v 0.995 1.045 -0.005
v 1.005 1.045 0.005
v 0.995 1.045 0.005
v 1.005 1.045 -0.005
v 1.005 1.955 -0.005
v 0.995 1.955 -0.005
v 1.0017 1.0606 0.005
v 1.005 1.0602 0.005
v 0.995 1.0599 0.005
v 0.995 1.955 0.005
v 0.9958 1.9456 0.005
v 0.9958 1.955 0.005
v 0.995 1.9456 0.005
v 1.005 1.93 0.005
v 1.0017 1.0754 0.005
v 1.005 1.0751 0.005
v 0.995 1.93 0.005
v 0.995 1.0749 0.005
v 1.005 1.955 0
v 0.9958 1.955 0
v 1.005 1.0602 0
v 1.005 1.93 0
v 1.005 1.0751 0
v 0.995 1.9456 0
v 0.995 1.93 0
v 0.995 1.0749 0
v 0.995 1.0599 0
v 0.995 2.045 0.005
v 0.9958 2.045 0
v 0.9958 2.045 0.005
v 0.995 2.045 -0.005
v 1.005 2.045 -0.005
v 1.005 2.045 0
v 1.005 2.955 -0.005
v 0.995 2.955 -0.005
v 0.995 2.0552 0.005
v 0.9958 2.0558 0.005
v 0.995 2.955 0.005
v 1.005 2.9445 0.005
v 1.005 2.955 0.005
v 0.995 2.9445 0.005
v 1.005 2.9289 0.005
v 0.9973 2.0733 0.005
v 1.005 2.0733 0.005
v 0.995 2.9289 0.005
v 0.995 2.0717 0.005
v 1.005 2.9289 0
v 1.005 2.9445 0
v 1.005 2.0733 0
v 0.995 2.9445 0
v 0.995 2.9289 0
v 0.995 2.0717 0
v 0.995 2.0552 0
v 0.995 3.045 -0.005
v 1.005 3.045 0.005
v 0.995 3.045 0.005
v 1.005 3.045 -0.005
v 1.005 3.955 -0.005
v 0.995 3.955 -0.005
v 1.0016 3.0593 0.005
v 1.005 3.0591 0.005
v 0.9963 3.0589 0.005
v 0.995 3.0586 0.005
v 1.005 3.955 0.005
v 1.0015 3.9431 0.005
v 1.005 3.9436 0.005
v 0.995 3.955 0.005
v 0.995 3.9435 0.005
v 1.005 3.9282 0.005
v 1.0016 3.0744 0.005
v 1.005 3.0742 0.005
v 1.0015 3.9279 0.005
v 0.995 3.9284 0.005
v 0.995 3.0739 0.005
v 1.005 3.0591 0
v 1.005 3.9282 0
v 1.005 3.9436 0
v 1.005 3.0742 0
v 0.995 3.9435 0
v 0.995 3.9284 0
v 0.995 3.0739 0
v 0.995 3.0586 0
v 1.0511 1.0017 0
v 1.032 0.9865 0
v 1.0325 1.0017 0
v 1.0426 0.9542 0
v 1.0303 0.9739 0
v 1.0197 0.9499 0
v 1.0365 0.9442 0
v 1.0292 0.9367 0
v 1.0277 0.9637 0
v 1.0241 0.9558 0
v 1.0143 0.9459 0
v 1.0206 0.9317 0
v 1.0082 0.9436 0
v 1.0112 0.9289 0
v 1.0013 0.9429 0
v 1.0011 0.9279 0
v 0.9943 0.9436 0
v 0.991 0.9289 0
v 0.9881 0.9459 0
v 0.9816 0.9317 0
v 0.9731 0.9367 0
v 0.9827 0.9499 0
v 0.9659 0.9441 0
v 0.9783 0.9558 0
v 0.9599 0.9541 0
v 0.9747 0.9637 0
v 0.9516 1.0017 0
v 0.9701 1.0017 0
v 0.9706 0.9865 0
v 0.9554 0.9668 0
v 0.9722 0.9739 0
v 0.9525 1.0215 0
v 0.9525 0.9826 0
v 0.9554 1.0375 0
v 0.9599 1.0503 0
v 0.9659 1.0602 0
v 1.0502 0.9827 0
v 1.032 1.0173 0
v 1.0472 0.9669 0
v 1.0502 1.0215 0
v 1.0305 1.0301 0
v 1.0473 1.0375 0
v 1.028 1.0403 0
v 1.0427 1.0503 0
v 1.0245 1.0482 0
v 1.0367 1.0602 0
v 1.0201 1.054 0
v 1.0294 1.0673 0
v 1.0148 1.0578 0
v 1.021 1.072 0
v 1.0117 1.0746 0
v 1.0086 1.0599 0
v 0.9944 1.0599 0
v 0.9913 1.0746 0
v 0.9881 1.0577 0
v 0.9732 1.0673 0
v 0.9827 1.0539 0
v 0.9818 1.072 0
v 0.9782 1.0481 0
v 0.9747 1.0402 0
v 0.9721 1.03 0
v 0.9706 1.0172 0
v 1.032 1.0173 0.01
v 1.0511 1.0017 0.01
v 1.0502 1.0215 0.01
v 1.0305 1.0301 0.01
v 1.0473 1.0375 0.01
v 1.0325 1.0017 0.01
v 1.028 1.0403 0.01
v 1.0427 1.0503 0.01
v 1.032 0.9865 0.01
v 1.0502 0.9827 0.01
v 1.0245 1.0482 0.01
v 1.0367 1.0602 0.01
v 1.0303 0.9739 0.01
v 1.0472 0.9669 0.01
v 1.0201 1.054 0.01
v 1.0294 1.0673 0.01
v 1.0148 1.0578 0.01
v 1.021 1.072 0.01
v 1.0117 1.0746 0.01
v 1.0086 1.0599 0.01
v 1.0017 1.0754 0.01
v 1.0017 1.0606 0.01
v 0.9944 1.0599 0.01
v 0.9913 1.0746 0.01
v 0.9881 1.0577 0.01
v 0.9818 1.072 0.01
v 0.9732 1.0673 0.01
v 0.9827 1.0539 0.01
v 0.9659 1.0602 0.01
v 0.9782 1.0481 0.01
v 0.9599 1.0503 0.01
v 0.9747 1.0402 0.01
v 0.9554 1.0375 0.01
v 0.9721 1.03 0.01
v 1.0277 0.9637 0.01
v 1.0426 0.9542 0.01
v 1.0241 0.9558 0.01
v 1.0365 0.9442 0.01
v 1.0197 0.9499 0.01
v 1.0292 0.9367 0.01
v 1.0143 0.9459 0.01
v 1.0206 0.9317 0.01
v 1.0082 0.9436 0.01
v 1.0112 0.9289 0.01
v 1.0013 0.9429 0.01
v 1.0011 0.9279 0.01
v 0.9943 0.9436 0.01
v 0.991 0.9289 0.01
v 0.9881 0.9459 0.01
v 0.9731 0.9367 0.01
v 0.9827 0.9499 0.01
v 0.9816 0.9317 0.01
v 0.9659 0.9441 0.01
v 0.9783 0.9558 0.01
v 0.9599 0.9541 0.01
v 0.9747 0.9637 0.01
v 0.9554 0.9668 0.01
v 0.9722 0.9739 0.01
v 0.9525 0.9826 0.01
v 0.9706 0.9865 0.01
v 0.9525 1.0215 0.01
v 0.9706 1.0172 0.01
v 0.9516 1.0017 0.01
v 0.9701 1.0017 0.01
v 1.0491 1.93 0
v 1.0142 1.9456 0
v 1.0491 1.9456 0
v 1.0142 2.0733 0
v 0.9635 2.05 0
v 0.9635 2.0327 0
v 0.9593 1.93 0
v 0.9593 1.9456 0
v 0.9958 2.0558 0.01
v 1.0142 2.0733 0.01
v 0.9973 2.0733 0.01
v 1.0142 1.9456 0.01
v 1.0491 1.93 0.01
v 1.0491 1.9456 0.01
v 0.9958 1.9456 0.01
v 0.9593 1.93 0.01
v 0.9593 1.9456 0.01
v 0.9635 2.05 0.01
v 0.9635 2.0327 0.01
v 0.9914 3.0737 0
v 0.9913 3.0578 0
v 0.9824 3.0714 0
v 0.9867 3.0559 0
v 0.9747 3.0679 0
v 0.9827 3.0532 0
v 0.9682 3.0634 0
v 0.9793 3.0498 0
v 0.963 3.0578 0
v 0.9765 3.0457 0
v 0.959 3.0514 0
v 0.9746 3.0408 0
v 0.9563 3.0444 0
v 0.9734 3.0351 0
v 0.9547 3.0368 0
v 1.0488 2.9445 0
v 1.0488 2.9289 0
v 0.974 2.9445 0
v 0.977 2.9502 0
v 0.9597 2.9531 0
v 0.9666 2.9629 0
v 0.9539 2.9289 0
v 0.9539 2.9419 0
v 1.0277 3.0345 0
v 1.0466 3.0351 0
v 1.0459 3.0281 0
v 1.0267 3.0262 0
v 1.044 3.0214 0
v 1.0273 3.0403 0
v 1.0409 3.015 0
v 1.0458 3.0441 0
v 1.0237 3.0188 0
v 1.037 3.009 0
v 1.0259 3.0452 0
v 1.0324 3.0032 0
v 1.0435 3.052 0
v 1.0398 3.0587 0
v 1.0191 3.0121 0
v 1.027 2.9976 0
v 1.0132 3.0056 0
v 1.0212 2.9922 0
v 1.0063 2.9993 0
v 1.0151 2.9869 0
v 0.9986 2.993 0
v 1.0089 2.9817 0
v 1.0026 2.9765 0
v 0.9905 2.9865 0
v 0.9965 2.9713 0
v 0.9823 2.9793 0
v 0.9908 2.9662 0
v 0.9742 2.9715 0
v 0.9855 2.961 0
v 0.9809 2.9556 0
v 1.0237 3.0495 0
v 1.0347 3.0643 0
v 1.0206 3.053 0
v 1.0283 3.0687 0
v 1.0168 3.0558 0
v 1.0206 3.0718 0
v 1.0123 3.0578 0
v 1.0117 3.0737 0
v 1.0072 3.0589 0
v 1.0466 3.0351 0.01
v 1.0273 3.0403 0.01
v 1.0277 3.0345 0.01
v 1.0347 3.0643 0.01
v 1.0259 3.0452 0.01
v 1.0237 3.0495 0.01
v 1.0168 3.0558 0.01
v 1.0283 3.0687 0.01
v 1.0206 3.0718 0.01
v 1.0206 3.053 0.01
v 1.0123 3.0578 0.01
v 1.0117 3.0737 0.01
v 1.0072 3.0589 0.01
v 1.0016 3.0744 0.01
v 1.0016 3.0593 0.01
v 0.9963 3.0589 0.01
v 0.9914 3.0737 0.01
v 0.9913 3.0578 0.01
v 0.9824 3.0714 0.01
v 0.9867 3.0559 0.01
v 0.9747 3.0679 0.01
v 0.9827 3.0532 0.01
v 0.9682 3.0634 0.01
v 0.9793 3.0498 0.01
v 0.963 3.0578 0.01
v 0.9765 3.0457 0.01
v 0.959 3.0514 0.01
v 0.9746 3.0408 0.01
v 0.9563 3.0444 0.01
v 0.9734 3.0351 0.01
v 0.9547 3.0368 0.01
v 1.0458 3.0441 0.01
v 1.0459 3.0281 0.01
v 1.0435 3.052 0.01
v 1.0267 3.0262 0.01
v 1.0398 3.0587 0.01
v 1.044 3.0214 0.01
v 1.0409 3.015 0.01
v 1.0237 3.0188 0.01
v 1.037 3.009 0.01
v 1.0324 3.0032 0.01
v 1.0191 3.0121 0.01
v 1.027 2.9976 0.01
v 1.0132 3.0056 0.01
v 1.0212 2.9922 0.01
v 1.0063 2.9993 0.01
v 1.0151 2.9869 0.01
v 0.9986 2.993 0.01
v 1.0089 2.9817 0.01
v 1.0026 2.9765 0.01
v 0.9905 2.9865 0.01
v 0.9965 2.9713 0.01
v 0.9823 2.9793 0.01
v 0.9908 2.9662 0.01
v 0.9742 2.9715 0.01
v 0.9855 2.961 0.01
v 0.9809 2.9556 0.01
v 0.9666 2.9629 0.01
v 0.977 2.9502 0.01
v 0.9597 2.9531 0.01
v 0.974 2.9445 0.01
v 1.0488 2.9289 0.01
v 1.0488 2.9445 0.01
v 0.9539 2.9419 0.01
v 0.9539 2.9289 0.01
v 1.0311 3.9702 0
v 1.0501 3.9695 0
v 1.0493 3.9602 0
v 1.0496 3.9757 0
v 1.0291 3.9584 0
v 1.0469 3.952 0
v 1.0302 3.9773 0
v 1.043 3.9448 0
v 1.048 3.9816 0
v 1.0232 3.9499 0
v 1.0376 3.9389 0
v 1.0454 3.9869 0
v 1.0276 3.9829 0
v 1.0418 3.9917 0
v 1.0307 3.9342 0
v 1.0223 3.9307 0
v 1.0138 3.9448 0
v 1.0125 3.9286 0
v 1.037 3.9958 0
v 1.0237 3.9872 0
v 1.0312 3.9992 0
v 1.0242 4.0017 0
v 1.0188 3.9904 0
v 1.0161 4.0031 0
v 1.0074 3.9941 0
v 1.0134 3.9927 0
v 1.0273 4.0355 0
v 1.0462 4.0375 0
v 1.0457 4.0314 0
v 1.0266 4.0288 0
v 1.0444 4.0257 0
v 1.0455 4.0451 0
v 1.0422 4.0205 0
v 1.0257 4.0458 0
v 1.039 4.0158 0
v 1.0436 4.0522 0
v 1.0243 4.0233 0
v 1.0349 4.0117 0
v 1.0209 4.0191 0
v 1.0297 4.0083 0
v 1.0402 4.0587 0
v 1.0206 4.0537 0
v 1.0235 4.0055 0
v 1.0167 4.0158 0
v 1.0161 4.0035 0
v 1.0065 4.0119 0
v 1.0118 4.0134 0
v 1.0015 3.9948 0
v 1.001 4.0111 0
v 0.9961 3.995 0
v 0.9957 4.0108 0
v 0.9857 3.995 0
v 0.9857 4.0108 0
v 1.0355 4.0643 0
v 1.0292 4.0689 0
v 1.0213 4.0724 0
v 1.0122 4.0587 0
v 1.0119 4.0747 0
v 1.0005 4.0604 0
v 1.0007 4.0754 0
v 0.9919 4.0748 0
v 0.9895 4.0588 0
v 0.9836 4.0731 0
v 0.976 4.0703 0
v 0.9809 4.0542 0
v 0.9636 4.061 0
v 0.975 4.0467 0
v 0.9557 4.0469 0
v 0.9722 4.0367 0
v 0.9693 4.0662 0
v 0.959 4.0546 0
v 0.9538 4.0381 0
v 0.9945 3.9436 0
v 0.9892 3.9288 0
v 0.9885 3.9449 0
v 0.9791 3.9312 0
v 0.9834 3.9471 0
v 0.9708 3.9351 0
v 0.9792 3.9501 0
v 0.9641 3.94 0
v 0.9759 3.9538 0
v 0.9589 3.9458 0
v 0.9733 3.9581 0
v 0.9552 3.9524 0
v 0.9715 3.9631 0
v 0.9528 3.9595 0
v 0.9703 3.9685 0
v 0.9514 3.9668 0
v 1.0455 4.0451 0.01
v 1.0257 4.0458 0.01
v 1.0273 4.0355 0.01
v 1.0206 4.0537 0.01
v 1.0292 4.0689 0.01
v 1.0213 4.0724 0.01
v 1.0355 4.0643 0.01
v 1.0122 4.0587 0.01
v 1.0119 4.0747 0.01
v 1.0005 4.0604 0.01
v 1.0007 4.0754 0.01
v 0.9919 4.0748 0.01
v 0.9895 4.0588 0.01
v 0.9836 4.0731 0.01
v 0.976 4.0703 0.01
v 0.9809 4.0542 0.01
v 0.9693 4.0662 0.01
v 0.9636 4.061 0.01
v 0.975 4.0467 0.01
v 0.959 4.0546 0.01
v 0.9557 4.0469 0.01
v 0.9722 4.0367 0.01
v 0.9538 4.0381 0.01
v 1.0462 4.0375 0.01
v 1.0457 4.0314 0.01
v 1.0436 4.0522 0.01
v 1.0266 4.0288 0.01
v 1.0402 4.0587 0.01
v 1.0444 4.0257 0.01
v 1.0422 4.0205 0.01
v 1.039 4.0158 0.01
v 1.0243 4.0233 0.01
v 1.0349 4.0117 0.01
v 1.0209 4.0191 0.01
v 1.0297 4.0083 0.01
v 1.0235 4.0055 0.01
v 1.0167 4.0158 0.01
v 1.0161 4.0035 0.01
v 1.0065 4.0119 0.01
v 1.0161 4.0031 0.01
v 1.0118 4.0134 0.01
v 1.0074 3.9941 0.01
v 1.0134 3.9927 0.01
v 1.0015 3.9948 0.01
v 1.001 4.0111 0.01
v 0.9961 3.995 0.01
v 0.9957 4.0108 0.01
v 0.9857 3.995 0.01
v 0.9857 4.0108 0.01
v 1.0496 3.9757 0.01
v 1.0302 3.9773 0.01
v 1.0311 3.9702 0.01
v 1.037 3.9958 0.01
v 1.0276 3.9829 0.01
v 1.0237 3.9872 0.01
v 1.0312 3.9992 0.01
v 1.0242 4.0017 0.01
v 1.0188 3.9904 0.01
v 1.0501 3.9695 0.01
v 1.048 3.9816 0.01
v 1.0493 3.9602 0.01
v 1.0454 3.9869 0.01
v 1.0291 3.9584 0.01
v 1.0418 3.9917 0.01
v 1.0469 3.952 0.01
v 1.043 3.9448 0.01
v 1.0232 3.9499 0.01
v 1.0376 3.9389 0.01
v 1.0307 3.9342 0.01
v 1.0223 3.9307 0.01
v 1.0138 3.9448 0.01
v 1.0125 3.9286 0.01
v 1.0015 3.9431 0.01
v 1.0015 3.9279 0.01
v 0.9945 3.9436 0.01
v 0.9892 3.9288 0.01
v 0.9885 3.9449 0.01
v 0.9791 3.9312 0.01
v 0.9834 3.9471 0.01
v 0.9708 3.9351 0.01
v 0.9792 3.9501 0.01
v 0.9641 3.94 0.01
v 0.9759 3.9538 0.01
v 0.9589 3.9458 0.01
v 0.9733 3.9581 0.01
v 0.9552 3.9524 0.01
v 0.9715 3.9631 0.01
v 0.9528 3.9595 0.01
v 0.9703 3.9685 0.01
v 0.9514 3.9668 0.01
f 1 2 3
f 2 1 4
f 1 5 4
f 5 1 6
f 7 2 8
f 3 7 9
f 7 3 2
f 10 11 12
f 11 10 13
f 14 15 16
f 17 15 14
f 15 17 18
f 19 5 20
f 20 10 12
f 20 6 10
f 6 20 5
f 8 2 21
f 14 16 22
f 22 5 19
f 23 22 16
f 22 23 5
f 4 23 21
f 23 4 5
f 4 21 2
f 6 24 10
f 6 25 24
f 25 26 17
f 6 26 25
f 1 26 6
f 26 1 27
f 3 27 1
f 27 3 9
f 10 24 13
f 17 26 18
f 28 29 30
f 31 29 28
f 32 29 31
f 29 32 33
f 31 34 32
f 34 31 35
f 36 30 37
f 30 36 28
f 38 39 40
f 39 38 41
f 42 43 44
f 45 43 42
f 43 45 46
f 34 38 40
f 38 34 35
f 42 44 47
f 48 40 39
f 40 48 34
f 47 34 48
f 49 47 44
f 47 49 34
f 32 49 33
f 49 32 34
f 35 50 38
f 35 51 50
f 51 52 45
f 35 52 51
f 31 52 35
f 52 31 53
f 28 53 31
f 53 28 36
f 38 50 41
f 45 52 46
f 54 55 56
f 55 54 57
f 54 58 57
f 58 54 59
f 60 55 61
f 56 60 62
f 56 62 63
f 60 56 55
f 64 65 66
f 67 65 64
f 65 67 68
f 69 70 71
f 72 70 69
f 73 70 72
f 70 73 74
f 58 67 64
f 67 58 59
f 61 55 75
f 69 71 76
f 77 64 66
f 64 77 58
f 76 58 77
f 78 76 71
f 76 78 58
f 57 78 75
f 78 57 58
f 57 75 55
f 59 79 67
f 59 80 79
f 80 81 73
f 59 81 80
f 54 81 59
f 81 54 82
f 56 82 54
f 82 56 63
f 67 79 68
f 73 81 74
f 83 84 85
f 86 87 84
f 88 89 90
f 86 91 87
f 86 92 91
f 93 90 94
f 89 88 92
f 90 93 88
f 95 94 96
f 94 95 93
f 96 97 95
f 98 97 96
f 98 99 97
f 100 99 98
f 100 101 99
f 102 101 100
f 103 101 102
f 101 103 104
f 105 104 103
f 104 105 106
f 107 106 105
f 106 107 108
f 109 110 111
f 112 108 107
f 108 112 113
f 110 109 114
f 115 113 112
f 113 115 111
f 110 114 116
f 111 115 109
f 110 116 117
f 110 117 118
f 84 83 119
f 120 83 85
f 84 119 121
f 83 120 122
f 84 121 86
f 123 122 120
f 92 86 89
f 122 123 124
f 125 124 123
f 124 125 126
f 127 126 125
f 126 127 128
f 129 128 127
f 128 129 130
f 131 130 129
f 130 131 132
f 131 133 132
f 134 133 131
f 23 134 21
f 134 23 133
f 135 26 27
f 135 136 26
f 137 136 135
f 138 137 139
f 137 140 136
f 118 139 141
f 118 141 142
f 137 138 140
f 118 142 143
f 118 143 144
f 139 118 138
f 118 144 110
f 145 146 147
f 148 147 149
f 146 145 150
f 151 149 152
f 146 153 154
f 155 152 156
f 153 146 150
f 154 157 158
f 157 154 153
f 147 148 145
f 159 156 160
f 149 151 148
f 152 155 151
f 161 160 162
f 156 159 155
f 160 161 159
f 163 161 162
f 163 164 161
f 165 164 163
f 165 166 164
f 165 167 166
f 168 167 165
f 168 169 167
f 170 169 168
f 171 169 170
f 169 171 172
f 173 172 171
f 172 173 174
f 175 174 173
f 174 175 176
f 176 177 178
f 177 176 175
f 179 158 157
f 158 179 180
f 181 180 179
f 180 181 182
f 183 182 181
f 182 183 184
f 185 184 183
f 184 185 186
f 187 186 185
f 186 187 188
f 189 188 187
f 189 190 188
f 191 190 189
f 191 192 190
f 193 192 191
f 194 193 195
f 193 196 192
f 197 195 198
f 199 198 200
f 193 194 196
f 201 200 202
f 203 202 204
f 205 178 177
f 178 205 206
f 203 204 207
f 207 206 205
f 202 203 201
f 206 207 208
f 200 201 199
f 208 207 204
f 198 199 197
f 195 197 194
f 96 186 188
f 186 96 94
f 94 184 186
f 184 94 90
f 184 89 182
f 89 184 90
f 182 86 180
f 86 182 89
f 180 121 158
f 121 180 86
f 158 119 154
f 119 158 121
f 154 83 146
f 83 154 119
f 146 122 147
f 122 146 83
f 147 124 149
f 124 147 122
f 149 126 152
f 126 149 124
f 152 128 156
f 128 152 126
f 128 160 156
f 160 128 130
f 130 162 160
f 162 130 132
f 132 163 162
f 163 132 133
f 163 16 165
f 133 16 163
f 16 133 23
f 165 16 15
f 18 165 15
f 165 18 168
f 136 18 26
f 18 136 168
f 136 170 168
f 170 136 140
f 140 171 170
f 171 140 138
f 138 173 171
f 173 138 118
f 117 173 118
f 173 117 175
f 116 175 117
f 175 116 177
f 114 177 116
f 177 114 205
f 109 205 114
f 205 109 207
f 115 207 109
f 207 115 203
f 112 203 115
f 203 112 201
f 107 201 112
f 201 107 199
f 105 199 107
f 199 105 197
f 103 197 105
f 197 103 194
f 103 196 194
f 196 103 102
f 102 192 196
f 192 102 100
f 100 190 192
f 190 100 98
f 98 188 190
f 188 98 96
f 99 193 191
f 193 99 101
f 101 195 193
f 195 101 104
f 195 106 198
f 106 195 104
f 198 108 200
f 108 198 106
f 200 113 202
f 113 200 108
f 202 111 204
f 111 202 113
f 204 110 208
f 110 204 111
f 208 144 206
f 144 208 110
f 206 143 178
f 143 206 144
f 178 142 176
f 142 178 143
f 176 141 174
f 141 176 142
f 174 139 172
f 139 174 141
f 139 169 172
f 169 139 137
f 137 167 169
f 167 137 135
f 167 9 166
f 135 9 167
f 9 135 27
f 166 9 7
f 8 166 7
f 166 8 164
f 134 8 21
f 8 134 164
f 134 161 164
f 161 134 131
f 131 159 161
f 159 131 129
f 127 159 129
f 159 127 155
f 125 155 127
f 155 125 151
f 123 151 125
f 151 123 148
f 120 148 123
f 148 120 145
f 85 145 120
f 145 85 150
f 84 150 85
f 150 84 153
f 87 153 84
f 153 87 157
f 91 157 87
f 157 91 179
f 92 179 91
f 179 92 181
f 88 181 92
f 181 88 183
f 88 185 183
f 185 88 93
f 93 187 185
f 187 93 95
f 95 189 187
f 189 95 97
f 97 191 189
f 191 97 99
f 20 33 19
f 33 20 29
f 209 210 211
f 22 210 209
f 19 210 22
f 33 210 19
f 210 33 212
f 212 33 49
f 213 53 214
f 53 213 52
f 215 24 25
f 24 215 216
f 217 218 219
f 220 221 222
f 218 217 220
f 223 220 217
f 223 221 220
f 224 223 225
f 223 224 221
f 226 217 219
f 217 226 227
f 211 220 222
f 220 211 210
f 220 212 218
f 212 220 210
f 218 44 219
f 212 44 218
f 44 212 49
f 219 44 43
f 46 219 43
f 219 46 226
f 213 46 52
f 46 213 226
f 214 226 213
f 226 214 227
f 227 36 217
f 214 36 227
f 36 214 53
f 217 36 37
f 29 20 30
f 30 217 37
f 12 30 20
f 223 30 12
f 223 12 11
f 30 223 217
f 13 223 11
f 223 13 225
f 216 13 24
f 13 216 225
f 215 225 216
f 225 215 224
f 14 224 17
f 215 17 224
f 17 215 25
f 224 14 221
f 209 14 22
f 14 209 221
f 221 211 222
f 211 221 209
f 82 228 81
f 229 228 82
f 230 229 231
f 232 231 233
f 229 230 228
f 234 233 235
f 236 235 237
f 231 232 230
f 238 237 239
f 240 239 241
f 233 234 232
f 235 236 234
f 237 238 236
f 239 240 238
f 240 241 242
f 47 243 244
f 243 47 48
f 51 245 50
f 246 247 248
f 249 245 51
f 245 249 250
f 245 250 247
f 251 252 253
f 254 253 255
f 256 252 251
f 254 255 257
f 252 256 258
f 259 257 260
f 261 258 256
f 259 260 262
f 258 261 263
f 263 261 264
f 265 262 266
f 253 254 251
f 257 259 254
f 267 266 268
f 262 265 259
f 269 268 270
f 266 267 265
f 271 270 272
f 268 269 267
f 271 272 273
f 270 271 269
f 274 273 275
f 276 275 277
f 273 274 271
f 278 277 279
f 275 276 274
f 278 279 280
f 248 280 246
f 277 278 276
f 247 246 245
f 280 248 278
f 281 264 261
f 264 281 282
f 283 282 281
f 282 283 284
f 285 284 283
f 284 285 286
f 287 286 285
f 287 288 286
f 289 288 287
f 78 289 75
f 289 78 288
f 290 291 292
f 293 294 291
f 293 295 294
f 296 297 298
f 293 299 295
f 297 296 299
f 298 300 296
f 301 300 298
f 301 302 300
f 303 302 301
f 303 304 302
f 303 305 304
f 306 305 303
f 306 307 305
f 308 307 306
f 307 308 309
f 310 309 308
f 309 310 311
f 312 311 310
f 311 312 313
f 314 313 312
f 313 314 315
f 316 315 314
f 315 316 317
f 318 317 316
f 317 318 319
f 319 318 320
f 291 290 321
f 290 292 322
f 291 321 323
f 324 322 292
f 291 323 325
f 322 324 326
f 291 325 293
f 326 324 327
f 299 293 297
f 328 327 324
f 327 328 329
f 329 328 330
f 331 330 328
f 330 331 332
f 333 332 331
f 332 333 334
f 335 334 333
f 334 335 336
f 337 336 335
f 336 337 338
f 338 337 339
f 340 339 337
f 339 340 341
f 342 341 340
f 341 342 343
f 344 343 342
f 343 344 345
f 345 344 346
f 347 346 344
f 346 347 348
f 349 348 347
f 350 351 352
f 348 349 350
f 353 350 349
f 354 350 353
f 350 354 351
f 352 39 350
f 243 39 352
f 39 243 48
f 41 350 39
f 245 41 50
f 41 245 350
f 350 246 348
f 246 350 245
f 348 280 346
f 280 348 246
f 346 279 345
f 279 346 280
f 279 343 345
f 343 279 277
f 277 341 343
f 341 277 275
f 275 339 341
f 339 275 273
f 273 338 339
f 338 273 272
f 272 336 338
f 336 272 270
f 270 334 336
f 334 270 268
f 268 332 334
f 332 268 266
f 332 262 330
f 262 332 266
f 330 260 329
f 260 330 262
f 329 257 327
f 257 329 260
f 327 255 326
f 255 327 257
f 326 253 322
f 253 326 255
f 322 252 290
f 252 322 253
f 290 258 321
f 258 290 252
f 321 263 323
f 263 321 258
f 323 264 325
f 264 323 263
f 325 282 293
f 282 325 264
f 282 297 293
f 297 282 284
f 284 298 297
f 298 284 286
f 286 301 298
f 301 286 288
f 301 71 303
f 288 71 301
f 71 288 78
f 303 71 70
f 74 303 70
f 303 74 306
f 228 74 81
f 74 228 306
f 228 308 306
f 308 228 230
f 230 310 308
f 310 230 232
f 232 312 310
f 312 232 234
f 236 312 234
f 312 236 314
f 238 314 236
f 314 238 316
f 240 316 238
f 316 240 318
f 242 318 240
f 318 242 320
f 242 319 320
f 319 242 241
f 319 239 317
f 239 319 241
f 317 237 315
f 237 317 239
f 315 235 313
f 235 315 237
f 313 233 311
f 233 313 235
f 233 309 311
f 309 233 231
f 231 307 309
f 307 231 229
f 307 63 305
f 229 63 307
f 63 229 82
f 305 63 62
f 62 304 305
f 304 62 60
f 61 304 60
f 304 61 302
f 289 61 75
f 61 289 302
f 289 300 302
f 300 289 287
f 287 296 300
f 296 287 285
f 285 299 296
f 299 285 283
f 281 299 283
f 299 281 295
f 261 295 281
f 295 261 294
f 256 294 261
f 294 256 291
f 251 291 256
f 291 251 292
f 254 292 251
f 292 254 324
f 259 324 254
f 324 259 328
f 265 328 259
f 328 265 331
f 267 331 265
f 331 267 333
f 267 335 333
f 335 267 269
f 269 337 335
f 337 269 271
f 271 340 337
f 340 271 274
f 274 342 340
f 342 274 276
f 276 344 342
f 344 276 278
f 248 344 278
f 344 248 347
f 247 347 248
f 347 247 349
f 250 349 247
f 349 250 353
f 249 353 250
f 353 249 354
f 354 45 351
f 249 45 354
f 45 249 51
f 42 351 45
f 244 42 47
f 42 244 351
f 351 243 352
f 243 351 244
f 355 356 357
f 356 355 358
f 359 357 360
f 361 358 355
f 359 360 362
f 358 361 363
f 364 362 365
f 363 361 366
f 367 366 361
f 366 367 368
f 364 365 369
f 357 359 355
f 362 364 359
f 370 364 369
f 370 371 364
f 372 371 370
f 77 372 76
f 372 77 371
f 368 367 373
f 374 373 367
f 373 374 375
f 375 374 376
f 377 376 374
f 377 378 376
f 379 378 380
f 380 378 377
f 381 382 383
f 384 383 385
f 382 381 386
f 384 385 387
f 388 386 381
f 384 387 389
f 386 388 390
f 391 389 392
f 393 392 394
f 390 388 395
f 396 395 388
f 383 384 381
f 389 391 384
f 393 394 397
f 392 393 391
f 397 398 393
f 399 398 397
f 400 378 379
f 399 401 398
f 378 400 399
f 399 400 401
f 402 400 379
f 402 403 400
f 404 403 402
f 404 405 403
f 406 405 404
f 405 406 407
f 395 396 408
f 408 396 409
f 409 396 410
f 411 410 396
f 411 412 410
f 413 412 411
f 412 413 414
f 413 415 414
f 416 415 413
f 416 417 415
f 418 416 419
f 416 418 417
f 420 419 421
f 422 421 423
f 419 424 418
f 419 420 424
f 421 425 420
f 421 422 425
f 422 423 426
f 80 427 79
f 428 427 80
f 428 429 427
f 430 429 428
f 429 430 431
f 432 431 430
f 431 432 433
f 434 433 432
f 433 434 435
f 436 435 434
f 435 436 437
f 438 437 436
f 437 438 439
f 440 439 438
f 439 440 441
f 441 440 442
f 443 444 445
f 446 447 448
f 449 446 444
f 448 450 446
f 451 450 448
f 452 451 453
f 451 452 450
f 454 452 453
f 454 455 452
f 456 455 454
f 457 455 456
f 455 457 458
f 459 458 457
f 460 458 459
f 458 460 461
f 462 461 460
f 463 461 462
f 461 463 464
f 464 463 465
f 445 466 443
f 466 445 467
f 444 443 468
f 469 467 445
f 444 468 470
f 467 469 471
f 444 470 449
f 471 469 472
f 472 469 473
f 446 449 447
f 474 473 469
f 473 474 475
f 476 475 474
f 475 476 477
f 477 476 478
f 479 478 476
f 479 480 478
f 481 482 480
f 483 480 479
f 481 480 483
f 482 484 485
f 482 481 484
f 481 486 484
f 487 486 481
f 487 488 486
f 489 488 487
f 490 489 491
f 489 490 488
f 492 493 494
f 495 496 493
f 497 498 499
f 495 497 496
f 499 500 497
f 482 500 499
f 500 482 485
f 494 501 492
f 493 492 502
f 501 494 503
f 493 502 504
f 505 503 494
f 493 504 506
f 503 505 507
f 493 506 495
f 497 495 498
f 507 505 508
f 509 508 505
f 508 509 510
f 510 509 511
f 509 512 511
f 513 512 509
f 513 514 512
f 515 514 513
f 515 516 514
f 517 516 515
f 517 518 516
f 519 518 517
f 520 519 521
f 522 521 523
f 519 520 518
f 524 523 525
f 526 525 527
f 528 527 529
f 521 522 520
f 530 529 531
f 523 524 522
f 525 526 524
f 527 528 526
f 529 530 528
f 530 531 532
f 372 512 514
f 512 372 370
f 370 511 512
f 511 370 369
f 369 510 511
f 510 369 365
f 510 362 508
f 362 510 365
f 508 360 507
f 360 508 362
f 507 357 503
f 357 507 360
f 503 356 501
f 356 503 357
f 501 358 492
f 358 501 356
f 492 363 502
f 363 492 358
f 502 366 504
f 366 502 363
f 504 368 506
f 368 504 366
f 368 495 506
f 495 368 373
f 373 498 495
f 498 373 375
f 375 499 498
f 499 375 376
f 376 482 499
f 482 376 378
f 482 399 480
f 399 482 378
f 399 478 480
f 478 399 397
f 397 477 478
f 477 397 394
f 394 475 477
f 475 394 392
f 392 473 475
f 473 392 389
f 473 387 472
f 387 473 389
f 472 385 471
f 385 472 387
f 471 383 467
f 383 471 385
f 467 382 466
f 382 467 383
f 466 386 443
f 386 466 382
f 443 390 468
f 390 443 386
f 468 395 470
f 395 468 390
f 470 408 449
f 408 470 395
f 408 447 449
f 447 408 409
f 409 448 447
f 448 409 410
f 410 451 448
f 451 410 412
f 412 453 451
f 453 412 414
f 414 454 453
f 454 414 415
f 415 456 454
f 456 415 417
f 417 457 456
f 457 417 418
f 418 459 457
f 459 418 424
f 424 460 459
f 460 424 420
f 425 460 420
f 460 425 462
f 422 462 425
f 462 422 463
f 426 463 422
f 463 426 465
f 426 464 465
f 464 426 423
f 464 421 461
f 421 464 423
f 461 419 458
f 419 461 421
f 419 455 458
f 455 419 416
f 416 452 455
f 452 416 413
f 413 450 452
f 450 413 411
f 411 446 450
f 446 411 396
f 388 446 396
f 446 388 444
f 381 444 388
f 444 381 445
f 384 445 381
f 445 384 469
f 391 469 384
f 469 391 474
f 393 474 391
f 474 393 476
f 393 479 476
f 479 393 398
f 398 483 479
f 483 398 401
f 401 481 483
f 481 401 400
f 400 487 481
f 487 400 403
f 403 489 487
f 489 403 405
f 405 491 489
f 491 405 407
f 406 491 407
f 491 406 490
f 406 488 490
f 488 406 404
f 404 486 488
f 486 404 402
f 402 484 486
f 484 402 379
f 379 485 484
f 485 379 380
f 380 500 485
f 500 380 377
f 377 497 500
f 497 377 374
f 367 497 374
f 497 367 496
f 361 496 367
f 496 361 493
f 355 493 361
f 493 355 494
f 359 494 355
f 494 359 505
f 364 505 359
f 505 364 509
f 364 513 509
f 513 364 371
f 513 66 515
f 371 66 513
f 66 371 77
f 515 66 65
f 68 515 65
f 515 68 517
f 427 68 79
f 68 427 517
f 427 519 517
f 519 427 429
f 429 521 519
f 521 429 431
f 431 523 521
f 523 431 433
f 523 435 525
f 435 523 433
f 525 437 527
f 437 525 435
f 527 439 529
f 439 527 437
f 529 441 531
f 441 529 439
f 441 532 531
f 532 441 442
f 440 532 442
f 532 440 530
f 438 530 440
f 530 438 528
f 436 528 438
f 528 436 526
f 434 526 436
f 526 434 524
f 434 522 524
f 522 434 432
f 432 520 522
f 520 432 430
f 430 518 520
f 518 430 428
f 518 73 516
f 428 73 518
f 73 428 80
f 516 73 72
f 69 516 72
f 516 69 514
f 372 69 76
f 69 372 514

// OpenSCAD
hull() {
    translate([1.0, 1.05, 0]) cube([0.01, 0.01, 0.01], center=true);
    translate([1.0, 1.9500000000000002, 0]) cube([0.01, 0.01, 0.01], center=true);
}


hull() {
    translate([1.0, 2.05, 0]) cube([0.01, 0.01, 0.01], center=true);
    translate([1.0, 2.95, 0]) cube([0.01, 0.01, 0.01], center=true);
}


hull() {
    translate([1.0, 3.0500000000000003, 0]) cube([0.01, 0.01, 0.01], center=true);
    translate([1.0, 3.95, 0]) cube([0.01, 0.01, 0.01], center=true);
}


translate([1, 1, 0]) linear_extrude(0.01) text("0",size=0.15, halign="center", valign="center");

translate([1, 2, 0]) linear_extrude(0.01) text("1",size=0.15, halign="center", valign="center");

translate([1, 3, 0]) linear_extrude(0.01) text("2",size=0.15, halign="center", valign="center");

translate([1, 4, 0]) linear_extrude(0.01) text("3",size=0.15, halign="center", valign="center");
